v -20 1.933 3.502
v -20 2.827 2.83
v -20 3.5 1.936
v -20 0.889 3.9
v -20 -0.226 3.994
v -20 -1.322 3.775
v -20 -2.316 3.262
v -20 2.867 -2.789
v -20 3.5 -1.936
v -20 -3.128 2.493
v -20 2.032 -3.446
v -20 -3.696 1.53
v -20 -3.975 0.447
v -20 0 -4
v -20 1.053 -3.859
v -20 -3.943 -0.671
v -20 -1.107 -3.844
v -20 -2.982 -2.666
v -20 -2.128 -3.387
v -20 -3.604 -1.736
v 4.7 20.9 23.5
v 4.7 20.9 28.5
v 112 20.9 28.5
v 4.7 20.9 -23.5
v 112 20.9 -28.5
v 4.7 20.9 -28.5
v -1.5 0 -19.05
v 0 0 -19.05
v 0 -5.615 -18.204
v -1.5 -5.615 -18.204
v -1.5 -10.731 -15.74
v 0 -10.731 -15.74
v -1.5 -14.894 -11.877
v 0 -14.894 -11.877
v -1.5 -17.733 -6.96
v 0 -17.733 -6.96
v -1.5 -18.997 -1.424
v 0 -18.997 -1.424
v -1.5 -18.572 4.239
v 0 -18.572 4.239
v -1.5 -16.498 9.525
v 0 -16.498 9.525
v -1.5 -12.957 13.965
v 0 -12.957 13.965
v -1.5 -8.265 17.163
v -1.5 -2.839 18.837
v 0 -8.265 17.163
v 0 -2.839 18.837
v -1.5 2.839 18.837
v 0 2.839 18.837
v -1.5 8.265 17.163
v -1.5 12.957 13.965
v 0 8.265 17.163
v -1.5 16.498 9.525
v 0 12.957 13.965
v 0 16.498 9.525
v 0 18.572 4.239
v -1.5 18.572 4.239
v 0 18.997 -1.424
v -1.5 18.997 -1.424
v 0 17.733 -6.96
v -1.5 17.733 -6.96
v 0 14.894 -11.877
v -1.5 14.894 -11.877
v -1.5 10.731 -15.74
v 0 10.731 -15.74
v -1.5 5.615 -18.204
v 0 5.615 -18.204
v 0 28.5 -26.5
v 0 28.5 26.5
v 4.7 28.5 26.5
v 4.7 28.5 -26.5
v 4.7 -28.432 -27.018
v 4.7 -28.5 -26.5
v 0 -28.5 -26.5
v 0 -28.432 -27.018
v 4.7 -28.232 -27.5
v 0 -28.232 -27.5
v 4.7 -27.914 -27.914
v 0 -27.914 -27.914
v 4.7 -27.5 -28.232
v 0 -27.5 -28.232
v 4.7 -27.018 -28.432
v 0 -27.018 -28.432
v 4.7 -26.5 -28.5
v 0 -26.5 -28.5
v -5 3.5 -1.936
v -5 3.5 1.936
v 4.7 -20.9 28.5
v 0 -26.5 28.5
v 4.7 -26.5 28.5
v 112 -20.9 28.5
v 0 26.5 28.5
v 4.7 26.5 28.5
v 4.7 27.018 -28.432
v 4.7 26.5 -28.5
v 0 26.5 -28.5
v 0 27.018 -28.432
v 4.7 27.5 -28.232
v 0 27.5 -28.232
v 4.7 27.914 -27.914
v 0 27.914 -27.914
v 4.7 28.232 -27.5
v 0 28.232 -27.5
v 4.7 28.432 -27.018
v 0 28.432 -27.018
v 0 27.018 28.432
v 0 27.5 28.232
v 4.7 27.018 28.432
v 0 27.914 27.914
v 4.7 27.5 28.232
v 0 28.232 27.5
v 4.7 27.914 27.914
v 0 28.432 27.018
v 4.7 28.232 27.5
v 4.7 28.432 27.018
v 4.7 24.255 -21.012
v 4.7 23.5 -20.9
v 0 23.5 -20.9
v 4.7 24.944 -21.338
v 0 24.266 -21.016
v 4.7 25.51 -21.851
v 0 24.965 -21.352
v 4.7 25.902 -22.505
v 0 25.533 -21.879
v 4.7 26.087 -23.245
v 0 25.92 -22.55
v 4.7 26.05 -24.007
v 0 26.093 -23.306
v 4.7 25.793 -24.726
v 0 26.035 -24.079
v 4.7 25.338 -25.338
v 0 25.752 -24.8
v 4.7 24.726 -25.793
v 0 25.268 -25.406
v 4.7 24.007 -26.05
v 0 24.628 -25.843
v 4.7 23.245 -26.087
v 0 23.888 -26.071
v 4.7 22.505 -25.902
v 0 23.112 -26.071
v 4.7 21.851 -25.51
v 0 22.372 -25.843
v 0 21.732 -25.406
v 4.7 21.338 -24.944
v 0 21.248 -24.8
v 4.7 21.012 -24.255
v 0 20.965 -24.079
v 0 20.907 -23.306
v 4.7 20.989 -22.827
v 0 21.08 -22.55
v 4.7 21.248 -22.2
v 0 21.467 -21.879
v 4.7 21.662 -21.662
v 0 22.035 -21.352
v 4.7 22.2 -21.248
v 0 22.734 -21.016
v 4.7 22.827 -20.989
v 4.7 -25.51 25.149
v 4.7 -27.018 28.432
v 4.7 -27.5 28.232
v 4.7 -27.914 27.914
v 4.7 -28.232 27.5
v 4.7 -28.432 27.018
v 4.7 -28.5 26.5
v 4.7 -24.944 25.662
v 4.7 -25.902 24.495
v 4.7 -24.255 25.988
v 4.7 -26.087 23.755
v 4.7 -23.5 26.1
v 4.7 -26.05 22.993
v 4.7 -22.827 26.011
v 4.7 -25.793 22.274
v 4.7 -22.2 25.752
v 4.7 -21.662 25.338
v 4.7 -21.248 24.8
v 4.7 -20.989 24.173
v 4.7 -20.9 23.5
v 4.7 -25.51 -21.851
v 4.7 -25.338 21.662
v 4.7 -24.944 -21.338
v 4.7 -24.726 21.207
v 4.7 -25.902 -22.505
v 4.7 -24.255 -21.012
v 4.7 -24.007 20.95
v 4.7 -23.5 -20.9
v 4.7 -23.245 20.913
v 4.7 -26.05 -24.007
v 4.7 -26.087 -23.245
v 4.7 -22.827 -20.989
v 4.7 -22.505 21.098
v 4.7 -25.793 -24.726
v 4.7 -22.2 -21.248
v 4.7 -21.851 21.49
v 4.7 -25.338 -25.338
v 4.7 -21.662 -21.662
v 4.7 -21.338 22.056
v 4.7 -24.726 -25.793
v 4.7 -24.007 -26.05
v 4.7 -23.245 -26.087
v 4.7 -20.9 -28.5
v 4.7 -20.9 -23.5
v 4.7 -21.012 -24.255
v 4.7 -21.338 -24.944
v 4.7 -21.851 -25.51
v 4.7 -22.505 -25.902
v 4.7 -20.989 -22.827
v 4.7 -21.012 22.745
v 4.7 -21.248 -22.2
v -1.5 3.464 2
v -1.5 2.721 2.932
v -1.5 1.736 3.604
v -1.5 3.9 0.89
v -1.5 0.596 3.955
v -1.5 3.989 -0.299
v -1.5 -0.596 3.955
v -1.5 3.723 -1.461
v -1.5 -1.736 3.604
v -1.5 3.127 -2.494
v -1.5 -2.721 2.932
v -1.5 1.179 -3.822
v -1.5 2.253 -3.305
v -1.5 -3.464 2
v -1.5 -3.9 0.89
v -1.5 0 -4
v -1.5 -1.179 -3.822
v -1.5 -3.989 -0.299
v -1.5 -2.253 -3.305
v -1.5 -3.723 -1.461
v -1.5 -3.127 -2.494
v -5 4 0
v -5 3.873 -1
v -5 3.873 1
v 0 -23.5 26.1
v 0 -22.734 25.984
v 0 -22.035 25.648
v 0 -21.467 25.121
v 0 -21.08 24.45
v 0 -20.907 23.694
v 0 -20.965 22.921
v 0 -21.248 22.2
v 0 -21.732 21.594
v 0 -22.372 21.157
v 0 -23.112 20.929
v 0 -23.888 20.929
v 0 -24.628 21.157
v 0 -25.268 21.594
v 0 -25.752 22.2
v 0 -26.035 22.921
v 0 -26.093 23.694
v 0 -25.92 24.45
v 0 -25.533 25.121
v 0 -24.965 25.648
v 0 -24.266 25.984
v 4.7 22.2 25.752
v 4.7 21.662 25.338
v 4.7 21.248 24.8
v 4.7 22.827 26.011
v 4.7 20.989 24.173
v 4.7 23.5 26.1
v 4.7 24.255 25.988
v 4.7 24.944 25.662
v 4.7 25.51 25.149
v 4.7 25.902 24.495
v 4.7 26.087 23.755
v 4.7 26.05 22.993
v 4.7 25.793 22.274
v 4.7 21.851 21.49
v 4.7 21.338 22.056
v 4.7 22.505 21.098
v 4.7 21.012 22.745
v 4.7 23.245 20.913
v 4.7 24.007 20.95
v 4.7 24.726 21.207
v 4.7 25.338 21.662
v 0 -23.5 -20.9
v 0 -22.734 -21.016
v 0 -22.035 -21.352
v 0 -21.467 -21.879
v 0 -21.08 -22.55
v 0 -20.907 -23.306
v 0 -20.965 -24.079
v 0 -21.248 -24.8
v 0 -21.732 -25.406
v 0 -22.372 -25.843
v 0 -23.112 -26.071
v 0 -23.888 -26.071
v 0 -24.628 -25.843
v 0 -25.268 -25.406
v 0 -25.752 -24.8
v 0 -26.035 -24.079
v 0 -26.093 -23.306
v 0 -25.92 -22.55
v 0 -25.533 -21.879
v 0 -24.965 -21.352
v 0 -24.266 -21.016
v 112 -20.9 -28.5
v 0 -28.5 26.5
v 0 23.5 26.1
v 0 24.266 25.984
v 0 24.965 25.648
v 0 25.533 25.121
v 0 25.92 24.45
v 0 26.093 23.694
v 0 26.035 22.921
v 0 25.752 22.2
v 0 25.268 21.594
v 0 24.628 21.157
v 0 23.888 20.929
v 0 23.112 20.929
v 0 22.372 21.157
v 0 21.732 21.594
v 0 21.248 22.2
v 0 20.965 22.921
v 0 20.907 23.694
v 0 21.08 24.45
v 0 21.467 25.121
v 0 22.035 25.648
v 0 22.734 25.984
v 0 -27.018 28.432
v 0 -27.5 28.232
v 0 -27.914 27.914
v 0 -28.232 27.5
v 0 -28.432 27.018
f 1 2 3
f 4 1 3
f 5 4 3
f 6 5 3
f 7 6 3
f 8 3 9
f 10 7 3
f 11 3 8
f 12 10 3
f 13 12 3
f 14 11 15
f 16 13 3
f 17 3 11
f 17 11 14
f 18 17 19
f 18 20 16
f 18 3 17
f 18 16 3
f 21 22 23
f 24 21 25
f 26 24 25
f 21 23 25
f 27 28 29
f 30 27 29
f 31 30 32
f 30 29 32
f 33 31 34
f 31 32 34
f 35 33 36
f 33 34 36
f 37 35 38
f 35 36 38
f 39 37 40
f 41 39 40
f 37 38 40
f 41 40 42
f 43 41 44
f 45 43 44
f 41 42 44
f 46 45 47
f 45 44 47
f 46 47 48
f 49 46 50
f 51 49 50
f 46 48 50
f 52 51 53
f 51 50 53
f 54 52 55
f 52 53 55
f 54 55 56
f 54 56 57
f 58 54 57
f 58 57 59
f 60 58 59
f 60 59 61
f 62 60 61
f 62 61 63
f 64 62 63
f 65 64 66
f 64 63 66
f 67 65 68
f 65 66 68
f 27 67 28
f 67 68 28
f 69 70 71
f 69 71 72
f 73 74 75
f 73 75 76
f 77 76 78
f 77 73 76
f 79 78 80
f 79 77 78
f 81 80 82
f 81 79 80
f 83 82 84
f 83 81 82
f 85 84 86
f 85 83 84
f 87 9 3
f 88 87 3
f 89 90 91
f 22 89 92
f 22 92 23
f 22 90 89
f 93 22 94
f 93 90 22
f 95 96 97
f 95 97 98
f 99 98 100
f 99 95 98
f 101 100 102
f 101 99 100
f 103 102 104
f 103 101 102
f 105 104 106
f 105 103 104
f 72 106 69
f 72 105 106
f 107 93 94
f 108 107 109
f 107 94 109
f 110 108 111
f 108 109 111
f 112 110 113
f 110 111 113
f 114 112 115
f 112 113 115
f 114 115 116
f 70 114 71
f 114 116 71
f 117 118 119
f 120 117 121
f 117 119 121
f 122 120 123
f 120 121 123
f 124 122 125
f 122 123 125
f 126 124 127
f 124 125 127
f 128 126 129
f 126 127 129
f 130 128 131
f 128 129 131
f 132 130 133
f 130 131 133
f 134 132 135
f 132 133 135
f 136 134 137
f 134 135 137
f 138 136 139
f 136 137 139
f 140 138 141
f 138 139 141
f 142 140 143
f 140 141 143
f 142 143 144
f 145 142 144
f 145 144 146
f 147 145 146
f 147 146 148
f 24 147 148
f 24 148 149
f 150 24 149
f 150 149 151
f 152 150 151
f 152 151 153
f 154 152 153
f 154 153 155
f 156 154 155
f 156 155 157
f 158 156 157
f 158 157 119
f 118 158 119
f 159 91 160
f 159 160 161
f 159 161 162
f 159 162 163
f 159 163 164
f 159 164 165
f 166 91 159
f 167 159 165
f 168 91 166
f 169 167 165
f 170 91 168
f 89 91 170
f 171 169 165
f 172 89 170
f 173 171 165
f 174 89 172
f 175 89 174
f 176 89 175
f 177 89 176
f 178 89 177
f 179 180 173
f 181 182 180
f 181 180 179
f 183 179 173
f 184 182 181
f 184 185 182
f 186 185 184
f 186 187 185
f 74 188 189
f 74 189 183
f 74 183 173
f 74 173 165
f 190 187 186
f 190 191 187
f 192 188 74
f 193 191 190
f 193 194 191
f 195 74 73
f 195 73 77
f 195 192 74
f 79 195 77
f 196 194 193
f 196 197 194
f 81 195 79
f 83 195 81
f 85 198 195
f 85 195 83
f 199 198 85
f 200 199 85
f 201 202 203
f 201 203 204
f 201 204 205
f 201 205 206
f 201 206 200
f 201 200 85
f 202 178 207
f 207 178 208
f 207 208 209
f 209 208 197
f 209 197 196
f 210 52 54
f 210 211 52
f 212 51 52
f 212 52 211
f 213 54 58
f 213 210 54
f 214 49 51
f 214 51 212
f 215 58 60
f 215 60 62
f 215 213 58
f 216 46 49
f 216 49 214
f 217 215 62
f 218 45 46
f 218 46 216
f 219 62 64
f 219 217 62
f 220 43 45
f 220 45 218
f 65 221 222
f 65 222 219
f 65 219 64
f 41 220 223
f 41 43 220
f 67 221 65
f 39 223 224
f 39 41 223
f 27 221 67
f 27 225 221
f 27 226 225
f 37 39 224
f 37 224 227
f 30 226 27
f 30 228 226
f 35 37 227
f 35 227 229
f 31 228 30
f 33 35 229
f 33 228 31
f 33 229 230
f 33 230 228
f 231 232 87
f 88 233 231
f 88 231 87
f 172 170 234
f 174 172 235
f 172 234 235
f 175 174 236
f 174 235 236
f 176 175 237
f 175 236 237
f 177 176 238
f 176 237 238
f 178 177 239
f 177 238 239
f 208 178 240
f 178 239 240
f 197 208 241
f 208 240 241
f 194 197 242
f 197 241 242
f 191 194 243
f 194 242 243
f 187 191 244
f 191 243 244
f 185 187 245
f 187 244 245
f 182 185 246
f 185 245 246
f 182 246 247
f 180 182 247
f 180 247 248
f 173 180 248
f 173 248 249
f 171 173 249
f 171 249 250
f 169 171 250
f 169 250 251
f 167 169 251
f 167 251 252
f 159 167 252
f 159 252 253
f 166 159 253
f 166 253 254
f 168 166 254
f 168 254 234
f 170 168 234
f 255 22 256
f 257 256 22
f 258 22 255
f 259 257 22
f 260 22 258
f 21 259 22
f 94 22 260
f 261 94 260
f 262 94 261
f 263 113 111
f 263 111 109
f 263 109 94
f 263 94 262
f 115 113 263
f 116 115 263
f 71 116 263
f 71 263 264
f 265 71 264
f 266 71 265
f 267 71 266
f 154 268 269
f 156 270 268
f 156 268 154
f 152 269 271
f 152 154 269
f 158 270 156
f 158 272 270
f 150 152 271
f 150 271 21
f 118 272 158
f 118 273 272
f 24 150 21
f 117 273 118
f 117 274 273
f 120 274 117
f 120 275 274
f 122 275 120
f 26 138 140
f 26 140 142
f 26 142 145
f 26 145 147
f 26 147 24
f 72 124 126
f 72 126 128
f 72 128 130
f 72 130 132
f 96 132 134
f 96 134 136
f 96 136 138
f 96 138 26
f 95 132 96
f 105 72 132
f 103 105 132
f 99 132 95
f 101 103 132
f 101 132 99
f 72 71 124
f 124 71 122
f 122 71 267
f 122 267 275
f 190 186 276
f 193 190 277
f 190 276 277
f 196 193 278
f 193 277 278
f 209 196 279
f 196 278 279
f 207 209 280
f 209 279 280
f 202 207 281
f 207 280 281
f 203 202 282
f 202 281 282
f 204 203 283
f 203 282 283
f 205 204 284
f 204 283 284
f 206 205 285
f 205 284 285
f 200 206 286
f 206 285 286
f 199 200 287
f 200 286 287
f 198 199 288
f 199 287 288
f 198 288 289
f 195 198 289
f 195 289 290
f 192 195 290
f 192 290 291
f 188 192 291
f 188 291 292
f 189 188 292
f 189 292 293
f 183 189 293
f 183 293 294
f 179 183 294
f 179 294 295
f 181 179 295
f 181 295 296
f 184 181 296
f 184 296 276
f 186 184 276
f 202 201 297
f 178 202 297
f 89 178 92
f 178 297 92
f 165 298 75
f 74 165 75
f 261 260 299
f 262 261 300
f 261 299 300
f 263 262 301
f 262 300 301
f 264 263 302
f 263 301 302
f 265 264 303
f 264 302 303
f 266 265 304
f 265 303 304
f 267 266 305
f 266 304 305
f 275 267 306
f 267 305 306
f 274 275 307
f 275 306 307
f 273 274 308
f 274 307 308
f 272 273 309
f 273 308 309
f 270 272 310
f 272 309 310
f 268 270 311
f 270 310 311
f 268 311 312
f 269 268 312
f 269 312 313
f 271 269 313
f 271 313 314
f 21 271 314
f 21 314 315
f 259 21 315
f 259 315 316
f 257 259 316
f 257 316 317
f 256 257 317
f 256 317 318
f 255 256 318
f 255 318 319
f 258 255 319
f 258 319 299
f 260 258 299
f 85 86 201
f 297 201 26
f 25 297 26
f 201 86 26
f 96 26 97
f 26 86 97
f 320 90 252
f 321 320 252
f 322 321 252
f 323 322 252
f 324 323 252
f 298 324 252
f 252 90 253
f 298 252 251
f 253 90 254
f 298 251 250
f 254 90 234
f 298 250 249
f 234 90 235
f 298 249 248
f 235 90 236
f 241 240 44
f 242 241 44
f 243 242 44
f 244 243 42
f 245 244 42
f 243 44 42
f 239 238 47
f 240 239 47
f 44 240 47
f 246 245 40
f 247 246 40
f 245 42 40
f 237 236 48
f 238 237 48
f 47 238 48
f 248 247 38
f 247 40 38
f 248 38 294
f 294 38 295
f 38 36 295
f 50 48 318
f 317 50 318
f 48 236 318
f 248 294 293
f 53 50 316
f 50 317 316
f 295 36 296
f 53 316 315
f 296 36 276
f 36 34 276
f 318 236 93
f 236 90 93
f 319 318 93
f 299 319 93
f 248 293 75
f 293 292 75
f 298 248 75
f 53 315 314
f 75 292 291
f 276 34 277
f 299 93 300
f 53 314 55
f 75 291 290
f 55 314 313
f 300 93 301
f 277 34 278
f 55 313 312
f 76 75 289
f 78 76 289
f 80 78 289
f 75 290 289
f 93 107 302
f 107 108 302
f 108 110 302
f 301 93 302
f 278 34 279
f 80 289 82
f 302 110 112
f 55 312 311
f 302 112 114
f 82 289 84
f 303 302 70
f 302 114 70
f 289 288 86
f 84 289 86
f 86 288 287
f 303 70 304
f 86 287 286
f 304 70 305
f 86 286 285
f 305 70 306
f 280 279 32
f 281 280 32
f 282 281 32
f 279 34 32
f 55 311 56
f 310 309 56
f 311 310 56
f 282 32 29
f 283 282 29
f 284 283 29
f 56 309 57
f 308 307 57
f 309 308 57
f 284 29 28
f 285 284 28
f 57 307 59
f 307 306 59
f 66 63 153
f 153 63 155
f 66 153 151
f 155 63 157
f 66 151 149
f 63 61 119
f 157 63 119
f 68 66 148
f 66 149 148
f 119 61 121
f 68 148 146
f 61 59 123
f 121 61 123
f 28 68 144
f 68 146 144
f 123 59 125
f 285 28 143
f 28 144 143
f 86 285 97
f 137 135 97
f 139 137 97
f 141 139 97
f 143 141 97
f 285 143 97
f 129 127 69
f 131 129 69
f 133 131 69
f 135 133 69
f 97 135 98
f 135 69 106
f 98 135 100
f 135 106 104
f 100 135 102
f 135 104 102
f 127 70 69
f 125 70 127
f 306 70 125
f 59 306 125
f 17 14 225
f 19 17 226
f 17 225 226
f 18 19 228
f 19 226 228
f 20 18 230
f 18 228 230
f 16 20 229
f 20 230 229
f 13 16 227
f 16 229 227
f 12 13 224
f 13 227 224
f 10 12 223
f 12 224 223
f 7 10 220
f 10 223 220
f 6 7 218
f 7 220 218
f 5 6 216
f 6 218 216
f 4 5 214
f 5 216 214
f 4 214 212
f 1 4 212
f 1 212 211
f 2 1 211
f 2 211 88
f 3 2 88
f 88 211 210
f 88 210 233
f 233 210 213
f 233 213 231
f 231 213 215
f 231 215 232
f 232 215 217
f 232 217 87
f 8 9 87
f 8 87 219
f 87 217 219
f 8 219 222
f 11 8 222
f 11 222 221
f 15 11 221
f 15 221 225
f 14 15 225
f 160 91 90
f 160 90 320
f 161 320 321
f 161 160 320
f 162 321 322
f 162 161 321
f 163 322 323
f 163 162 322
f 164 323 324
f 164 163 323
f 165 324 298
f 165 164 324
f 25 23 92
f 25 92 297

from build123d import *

# Parameters (mm, degrees)
SKETCH_1_W          = 57
SKETCH_1_H          = 57
EXTRUDE_1_DEPTH     = 112
FILLET_1_R          = 2
CUT_EXTRUDE_2_DEPTH = 107.3
SKETCH_6_R          = 4
EXTRUDE_2_DEPTH     = 20
SKETCH_7_W          = 9.44271558
SKETCH_7_H          = 0.5
CUT_EXTRUDE_3_DEPTH = 15
SKETCH_2_R          = 19.05
EXTRUDE_3_DEPTH     = 1.5
SKETCH_8_R          = 2.6
CUT_EXTRUDE_4_DEPTH = 4.7


with BuildPart() as part:
    # 草图1 → 凸台-拉伸1 (new body)
    with BuildSketch(Plane(origin=(0, 0, 0), x_dir=(0, 0, -1), z_dir=(1, 0, 0))):
        Rectangle(SKETCH_1_W, SKETCH_1_H)
    extrude(amount=EXTRUDE_1_DEPTH)

    # 圆角1
    fillet_1_edges = [part.edges().sort_by_distance(p)[0] for p in [
        (56, 28.5, 28.5),
        (56, 28.5, -28.5),
        (56, -28.5, -28.5),
        (56, -28.5, 28.5),
    ]]
    fillet(fillet_1_edges, radius=FILLET_1_R)

    # 草图5 → 切除-拉伸2 (cut)
    with BuildSketch(Plane(origin=(112, 0, 0), x_dir=(0, 0, -1), z_dir=(1, 0, 0))):
        Polygon((-20.9, 20.9), (20.9, 20.9), (28.5, 20.9), (28.5, 28.5), (-28.5, 28.5), (-28.5, 20.9), align=None)
        Polygon((-28.5, -28.5), (28.5, -28.5), (28.5, -20.9), (20.9, -20.9), (-20.9, -20.9), (-28.5, -20.9), align=None)
    extrude(amount=-CUT_EXTRUDE_2_DEPTH, mode=Mode.SUBTRACT)

    # 草图6 → 凸台-拉伸2 (add)
    with BuildSketch(Plane.ZY):
        with Locations(Location((0, 0, 0), (0, 0, 180))):
            Circle(SKETCH_6_R)
    extrude(amount=EXTRUDE_2_DEPTH)

    # 草图7 → 切除-拉伸3 (cut)
    with BuildSketch(Plane.ZY.offset(20)):
        with Locations((0.062351887, 3.75)):
            Rectangle(SKETCH_7_W, SKETCH_7_H)
    extrude(amount=-CUT_EXTRUDE_3_DEPTH, mode=Mode.SUBTRACT)

    # 草图2 → 凸台-拉伸3 (add)
    with BuildSketch(Plane.ZY):
        with Locations(Location((0, 0, 0), (0, 0, 180))):
            Circle(SKETCH_2_R)
    extrude(amount=EXTRUDE_3_DEPTH)

    # 草图8 → 切除-拉伸4 (cut)
    with BuildSketch(Plane.ZY):
        with Locations((-23.5, 23.5)):
            Circle(SKETCH_8_R)
        with Locations((23.5, 23.5)):
            Circle(SKETCH_8_R)
        with Locations((-23.5, -23.5)):
            Circle(SKETCH_8_R)
        with Locations((23.5, -23.5)):
            Circle(SKETCH_8_R)
    extrude(amount=-CUT_EXTRUDE_4_DEPTH, mode=Mode.SUBTRACT)


solid = part.part
